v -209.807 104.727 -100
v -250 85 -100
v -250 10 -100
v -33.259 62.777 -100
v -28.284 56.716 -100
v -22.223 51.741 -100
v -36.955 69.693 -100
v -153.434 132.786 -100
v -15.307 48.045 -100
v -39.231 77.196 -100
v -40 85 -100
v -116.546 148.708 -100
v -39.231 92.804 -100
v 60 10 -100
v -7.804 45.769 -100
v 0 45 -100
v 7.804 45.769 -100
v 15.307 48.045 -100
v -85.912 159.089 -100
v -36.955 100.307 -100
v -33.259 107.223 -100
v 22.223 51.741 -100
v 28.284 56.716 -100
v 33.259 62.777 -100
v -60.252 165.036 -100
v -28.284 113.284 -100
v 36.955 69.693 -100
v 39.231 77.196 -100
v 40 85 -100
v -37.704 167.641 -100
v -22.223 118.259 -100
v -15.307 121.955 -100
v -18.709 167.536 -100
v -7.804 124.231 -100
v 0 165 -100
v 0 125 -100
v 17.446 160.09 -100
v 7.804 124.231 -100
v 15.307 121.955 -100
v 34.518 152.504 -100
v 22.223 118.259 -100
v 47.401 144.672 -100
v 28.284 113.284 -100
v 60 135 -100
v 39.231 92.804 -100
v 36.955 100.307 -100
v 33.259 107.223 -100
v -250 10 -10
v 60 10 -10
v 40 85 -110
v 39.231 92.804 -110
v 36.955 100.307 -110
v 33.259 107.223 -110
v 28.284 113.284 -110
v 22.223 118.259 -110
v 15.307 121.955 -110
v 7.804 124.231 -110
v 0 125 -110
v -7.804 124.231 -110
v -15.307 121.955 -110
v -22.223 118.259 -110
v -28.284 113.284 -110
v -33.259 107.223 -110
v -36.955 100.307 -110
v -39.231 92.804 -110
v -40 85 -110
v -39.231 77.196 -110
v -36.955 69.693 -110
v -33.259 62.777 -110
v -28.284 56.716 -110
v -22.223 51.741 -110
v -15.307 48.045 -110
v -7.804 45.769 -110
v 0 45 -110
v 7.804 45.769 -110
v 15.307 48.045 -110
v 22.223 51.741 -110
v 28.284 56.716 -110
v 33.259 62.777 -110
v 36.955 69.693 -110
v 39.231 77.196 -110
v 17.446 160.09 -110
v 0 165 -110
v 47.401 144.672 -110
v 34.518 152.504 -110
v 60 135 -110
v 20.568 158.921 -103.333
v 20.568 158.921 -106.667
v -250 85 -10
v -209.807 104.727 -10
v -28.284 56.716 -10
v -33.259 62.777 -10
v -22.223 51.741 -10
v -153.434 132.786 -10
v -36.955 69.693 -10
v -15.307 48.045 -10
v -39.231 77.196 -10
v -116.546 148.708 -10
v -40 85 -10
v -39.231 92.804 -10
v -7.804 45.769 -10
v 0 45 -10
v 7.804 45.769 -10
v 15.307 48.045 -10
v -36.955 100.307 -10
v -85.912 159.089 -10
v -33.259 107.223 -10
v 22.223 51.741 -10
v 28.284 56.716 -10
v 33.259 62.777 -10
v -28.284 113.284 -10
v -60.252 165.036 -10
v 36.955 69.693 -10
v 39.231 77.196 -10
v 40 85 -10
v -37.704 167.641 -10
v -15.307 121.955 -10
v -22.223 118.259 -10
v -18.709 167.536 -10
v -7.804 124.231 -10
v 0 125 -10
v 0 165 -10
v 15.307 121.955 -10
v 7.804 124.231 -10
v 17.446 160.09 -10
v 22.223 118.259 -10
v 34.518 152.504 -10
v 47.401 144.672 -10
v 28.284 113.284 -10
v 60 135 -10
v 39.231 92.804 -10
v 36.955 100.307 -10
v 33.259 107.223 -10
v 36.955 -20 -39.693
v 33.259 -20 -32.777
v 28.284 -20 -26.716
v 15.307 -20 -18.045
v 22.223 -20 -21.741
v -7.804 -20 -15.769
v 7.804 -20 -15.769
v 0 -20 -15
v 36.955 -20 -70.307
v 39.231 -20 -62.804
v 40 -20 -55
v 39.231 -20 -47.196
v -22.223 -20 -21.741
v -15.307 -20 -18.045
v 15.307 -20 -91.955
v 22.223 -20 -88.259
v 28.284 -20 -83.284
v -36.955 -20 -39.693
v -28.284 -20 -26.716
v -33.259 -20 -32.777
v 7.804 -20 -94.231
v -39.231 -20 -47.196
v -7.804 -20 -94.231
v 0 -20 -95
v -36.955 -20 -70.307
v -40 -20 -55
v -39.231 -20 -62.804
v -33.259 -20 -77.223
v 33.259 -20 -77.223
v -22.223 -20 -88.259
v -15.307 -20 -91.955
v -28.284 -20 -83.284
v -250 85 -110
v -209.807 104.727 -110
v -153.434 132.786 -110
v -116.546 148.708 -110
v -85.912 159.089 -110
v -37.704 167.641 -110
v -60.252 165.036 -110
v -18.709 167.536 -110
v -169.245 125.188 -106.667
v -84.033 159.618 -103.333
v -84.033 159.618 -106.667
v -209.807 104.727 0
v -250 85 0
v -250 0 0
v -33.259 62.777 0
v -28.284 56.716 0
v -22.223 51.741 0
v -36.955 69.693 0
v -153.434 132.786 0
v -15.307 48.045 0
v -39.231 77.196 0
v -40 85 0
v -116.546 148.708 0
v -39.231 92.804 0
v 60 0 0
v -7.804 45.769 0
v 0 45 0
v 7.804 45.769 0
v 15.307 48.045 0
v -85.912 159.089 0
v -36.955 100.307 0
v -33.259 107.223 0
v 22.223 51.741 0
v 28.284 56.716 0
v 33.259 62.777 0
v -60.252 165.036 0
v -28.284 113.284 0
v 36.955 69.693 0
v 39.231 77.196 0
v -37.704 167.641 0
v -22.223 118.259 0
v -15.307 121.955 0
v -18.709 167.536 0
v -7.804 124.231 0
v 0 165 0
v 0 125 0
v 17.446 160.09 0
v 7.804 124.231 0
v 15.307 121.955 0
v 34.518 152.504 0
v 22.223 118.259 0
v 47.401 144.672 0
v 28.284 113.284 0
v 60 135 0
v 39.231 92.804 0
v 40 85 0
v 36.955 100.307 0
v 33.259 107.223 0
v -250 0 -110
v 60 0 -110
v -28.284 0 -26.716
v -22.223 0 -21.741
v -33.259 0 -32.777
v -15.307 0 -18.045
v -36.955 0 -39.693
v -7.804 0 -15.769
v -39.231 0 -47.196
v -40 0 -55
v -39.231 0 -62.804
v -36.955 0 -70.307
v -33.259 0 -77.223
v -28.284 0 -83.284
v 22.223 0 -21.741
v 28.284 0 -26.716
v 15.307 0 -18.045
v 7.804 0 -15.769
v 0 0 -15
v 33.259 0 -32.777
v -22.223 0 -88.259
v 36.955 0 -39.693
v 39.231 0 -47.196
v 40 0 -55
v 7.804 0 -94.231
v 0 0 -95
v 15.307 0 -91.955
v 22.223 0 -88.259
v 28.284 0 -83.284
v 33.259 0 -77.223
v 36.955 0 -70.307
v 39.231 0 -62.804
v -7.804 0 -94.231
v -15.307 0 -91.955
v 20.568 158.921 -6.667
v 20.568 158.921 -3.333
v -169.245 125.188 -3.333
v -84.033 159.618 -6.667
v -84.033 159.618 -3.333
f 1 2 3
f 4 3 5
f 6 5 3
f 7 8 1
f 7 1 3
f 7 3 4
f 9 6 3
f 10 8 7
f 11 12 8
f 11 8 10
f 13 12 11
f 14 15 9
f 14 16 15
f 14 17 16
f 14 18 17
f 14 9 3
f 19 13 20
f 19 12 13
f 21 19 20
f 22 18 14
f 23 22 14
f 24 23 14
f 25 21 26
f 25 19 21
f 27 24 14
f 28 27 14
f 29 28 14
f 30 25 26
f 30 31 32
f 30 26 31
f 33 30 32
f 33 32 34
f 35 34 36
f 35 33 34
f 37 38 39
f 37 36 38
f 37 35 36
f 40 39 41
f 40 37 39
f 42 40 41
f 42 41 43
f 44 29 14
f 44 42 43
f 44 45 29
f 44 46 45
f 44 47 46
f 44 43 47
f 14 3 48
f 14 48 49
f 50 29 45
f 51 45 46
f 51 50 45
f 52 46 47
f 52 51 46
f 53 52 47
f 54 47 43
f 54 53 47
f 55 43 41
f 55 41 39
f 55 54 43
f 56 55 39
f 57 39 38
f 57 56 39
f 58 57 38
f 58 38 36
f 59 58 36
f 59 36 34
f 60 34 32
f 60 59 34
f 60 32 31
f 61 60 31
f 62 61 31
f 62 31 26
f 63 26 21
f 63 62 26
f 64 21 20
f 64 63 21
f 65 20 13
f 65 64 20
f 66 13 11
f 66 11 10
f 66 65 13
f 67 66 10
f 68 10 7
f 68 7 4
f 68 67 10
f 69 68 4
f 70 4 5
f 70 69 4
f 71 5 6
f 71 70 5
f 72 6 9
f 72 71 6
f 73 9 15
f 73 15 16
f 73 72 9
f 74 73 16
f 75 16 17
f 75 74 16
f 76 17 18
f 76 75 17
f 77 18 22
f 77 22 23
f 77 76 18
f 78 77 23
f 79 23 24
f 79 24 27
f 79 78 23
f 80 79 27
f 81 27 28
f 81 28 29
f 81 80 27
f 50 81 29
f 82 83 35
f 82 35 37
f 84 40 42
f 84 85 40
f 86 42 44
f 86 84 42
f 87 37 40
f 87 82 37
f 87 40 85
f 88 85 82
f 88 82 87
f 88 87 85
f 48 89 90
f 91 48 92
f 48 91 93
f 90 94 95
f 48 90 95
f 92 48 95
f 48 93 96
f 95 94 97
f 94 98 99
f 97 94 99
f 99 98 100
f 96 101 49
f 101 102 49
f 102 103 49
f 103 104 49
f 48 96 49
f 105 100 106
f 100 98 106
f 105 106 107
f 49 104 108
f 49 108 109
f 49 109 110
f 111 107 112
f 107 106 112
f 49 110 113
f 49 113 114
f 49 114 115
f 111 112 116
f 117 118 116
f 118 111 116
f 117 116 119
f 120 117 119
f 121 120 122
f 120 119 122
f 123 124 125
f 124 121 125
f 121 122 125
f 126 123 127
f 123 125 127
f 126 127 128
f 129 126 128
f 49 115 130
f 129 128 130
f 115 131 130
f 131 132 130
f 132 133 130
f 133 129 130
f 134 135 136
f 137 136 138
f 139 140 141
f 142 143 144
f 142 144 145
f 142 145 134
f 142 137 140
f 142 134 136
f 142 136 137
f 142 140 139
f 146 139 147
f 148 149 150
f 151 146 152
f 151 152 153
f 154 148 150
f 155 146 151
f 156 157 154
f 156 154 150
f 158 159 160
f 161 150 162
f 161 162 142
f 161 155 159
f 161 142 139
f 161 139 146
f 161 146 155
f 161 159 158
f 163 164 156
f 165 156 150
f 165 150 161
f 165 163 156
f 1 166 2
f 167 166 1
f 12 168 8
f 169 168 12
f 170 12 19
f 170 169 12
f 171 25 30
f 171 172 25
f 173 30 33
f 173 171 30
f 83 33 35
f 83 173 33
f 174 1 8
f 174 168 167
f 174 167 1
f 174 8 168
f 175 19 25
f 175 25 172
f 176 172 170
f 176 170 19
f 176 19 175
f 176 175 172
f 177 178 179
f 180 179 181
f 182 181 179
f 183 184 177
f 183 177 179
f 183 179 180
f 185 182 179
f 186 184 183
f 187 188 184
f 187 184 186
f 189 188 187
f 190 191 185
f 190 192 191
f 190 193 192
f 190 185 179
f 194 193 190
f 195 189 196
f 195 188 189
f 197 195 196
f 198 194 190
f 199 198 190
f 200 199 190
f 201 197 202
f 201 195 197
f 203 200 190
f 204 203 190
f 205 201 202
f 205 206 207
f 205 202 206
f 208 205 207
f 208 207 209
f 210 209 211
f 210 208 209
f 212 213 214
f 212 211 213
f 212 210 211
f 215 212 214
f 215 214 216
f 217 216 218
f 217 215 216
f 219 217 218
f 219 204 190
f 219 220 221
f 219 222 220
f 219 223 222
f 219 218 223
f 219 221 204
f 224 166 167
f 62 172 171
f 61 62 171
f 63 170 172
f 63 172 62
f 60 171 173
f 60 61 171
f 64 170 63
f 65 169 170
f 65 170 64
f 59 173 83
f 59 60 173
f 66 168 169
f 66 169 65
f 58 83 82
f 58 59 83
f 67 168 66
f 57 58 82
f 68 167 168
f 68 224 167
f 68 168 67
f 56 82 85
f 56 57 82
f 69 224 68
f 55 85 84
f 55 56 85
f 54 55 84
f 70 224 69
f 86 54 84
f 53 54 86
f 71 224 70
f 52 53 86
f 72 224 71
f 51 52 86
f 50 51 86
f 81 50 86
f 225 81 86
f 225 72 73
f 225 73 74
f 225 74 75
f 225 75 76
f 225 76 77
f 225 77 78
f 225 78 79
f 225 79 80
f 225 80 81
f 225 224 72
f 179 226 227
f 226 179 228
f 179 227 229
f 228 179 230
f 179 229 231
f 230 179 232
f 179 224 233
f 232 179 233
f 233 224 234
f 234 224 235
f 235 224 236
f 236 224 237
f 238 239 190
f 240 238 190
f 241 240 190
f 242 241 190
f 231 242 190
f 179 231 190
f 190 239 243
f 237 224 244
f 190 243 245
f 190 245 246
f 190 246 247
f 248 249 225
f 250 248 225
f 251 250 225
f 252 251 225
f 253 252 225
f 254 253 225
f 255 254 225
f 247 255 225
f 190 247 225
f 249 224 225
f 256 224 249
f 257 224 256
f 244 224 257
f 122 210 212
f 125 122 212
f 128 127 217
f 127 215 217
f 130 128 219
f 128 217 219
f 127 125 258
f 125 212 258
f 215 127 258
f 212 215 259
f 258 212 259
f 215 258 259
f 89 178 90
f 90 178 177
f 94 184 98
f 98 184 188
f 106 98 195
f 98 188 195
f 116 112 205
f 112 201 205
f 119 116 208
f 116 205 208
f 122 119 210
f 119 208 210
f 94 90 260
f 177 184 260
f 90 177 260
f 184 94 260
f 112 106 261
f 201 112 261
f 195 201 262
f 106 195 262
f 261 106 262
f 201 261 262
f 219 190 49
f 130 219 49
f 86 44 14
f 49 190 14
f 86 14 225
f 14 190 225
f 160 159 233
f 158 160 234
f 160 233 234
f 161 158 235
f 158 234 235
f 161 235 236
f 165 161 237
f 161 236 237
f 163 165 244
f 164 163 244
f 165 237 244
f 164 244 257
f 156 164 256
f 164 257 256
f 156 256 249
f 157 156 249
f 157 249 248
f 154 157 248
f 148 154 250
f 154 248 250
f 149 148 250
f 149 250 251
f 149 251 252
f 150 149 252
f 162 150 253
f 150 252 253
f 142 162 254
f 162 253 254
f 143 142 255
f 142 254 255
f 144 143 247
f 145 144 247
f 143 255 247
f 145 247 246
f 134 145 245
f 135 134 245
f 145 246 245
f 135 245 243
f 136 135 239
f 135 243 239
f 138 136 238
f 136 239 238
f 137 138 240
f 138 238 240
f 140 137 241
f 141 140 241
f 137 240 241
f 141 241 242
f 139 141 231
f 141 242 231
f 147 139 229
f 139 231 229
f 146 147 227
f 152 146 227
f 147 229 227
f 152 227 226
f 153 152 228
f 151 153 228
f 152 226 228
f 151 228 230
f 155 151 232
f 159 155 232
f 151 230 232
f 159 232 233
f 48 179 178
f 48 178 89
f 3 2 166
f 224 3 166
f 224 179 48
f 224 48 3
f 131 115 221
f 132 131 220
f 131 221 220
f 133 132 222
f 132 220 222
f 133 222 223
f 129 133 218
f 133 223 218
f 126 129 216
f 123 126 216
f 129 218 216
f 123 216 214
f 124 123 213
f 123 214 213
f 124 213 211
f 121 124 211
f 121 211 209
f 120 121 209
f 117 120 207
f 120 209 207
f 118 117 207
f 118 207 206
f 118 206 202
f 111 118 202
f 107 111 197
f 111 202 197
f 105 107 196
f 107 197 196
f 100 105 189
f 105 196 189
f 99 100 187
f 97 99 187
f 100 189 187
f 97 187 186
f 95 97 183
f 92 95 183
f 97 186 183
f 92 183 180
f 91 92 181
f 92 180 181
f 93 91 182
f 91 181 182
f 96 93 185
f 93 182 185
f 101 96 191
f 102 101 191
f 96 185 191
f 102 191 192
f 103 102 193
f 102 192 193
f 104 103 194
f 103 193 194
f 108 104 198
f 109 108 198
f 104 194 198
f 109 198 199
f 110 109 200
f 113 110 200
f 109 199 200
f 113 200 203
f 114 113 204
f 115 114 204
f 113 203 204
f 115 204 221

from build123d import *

# Parameters (mm, degrees)
SKETCH1_W           = 310
SKETCH1_H           = 85
BOSS_EXTRUDE1_DEPTH = 10
SKETCH2_W           = 310
SKETCH2_H           = 100
BOSS_EXTRUDE2_DEPTH = 10
SKETCH3_R           = 40
CUT_EXTRUDE1_DEPTH  = 10
SKETCH4_R           = 40
BOSS_EXTRUDE3_DEPTH = 20


with BuildPart() as part:
    # Sketch1 → Boss-Extrude1 (new body)
    with BuildSketch(Plane.XY):
        with Locations((-95, 42.5)):
            Rectangle(SKETCH1_W, SKETCH1_H)
        with BuildLine():
            Line((-250, 85), (0, 85))
            Line((0, 85), (0, 165))
            add(Edge.make_bspline(
                [(-250, 85), (-173.352632869, 120.304599368), (-81.564360867, 181.904903874), (0, 165)],
                knots=[0, 0, 0, 0, 0.796760971, 0.796760971, 0.796760971, 0.796760971], degree=3))
        make_face()
        with BuildLine():
            Line((0, 85), (60, 85))
            Line((60, 85), (60, 135))
            add(Edge.make_bspline(
                [(0, 165), (20.805564215, 160.687870789), (40.945893284, 151.267674504), (60, 135)],
                knots=[0.796760971, 0.796760971, 0.796760971, 0.796760971, 1, 1, 1, 1], degree=3))
            Line((0, 165), (0, 85))
        make_face()
    boss_extrude1 = extrude(amount=-BOSS_EXTRUDE1_DEPTH)

    # Sketch2 → Boss-Extrude2 (add)
    with BuildSketch(Plane(origin=(0, 0, 0), x_dir=(1, 0, 0), z_dir=(0, 1, 0))):
        with Locations((-95, 60)):
            Rectangle(SKETCH2_W, SKETCH2_H)
    extrude(amount=BOSS_EXTRUDE2_DEPTH)

    # Sketch3 → Cut-Extrude1 (cut)
    with BuildSketch(Plane.XY):
        with Locations((0, 85)):
            Circle(SKETCH3_R)
    cut_extrude1 = extrude(amount=-CUT_EXTRUDE1_DEPTH, mode=Mode.SUBTRACT)

    # Mirror1: Boss-Extrude1, Cut-Extrude1 across plane
    add(boss_extrude1.mirror(Plane(origin=(0, 0, -55), x_dir=(1, 0, 0), z_dir=(0, 0, -1))))
    add(cut_extrude1.mirror(Plane(origin=(0, 0, -55), x_dir=(1, 0, 0), z_dir=(0, 0, -1))), mode=Mode.SUBTRACT)

    # Sketch4 → Boss-Extrude3 (add)
    with BuildSketch(Plane.XZ):
        with Locations(Location((0, -55, 0), (0, 0, 180))):
            Circle(SKETCH4_R)
    extrude(amount=BOSS_EXTRUDE3_DEPTH)


solid = part.part
